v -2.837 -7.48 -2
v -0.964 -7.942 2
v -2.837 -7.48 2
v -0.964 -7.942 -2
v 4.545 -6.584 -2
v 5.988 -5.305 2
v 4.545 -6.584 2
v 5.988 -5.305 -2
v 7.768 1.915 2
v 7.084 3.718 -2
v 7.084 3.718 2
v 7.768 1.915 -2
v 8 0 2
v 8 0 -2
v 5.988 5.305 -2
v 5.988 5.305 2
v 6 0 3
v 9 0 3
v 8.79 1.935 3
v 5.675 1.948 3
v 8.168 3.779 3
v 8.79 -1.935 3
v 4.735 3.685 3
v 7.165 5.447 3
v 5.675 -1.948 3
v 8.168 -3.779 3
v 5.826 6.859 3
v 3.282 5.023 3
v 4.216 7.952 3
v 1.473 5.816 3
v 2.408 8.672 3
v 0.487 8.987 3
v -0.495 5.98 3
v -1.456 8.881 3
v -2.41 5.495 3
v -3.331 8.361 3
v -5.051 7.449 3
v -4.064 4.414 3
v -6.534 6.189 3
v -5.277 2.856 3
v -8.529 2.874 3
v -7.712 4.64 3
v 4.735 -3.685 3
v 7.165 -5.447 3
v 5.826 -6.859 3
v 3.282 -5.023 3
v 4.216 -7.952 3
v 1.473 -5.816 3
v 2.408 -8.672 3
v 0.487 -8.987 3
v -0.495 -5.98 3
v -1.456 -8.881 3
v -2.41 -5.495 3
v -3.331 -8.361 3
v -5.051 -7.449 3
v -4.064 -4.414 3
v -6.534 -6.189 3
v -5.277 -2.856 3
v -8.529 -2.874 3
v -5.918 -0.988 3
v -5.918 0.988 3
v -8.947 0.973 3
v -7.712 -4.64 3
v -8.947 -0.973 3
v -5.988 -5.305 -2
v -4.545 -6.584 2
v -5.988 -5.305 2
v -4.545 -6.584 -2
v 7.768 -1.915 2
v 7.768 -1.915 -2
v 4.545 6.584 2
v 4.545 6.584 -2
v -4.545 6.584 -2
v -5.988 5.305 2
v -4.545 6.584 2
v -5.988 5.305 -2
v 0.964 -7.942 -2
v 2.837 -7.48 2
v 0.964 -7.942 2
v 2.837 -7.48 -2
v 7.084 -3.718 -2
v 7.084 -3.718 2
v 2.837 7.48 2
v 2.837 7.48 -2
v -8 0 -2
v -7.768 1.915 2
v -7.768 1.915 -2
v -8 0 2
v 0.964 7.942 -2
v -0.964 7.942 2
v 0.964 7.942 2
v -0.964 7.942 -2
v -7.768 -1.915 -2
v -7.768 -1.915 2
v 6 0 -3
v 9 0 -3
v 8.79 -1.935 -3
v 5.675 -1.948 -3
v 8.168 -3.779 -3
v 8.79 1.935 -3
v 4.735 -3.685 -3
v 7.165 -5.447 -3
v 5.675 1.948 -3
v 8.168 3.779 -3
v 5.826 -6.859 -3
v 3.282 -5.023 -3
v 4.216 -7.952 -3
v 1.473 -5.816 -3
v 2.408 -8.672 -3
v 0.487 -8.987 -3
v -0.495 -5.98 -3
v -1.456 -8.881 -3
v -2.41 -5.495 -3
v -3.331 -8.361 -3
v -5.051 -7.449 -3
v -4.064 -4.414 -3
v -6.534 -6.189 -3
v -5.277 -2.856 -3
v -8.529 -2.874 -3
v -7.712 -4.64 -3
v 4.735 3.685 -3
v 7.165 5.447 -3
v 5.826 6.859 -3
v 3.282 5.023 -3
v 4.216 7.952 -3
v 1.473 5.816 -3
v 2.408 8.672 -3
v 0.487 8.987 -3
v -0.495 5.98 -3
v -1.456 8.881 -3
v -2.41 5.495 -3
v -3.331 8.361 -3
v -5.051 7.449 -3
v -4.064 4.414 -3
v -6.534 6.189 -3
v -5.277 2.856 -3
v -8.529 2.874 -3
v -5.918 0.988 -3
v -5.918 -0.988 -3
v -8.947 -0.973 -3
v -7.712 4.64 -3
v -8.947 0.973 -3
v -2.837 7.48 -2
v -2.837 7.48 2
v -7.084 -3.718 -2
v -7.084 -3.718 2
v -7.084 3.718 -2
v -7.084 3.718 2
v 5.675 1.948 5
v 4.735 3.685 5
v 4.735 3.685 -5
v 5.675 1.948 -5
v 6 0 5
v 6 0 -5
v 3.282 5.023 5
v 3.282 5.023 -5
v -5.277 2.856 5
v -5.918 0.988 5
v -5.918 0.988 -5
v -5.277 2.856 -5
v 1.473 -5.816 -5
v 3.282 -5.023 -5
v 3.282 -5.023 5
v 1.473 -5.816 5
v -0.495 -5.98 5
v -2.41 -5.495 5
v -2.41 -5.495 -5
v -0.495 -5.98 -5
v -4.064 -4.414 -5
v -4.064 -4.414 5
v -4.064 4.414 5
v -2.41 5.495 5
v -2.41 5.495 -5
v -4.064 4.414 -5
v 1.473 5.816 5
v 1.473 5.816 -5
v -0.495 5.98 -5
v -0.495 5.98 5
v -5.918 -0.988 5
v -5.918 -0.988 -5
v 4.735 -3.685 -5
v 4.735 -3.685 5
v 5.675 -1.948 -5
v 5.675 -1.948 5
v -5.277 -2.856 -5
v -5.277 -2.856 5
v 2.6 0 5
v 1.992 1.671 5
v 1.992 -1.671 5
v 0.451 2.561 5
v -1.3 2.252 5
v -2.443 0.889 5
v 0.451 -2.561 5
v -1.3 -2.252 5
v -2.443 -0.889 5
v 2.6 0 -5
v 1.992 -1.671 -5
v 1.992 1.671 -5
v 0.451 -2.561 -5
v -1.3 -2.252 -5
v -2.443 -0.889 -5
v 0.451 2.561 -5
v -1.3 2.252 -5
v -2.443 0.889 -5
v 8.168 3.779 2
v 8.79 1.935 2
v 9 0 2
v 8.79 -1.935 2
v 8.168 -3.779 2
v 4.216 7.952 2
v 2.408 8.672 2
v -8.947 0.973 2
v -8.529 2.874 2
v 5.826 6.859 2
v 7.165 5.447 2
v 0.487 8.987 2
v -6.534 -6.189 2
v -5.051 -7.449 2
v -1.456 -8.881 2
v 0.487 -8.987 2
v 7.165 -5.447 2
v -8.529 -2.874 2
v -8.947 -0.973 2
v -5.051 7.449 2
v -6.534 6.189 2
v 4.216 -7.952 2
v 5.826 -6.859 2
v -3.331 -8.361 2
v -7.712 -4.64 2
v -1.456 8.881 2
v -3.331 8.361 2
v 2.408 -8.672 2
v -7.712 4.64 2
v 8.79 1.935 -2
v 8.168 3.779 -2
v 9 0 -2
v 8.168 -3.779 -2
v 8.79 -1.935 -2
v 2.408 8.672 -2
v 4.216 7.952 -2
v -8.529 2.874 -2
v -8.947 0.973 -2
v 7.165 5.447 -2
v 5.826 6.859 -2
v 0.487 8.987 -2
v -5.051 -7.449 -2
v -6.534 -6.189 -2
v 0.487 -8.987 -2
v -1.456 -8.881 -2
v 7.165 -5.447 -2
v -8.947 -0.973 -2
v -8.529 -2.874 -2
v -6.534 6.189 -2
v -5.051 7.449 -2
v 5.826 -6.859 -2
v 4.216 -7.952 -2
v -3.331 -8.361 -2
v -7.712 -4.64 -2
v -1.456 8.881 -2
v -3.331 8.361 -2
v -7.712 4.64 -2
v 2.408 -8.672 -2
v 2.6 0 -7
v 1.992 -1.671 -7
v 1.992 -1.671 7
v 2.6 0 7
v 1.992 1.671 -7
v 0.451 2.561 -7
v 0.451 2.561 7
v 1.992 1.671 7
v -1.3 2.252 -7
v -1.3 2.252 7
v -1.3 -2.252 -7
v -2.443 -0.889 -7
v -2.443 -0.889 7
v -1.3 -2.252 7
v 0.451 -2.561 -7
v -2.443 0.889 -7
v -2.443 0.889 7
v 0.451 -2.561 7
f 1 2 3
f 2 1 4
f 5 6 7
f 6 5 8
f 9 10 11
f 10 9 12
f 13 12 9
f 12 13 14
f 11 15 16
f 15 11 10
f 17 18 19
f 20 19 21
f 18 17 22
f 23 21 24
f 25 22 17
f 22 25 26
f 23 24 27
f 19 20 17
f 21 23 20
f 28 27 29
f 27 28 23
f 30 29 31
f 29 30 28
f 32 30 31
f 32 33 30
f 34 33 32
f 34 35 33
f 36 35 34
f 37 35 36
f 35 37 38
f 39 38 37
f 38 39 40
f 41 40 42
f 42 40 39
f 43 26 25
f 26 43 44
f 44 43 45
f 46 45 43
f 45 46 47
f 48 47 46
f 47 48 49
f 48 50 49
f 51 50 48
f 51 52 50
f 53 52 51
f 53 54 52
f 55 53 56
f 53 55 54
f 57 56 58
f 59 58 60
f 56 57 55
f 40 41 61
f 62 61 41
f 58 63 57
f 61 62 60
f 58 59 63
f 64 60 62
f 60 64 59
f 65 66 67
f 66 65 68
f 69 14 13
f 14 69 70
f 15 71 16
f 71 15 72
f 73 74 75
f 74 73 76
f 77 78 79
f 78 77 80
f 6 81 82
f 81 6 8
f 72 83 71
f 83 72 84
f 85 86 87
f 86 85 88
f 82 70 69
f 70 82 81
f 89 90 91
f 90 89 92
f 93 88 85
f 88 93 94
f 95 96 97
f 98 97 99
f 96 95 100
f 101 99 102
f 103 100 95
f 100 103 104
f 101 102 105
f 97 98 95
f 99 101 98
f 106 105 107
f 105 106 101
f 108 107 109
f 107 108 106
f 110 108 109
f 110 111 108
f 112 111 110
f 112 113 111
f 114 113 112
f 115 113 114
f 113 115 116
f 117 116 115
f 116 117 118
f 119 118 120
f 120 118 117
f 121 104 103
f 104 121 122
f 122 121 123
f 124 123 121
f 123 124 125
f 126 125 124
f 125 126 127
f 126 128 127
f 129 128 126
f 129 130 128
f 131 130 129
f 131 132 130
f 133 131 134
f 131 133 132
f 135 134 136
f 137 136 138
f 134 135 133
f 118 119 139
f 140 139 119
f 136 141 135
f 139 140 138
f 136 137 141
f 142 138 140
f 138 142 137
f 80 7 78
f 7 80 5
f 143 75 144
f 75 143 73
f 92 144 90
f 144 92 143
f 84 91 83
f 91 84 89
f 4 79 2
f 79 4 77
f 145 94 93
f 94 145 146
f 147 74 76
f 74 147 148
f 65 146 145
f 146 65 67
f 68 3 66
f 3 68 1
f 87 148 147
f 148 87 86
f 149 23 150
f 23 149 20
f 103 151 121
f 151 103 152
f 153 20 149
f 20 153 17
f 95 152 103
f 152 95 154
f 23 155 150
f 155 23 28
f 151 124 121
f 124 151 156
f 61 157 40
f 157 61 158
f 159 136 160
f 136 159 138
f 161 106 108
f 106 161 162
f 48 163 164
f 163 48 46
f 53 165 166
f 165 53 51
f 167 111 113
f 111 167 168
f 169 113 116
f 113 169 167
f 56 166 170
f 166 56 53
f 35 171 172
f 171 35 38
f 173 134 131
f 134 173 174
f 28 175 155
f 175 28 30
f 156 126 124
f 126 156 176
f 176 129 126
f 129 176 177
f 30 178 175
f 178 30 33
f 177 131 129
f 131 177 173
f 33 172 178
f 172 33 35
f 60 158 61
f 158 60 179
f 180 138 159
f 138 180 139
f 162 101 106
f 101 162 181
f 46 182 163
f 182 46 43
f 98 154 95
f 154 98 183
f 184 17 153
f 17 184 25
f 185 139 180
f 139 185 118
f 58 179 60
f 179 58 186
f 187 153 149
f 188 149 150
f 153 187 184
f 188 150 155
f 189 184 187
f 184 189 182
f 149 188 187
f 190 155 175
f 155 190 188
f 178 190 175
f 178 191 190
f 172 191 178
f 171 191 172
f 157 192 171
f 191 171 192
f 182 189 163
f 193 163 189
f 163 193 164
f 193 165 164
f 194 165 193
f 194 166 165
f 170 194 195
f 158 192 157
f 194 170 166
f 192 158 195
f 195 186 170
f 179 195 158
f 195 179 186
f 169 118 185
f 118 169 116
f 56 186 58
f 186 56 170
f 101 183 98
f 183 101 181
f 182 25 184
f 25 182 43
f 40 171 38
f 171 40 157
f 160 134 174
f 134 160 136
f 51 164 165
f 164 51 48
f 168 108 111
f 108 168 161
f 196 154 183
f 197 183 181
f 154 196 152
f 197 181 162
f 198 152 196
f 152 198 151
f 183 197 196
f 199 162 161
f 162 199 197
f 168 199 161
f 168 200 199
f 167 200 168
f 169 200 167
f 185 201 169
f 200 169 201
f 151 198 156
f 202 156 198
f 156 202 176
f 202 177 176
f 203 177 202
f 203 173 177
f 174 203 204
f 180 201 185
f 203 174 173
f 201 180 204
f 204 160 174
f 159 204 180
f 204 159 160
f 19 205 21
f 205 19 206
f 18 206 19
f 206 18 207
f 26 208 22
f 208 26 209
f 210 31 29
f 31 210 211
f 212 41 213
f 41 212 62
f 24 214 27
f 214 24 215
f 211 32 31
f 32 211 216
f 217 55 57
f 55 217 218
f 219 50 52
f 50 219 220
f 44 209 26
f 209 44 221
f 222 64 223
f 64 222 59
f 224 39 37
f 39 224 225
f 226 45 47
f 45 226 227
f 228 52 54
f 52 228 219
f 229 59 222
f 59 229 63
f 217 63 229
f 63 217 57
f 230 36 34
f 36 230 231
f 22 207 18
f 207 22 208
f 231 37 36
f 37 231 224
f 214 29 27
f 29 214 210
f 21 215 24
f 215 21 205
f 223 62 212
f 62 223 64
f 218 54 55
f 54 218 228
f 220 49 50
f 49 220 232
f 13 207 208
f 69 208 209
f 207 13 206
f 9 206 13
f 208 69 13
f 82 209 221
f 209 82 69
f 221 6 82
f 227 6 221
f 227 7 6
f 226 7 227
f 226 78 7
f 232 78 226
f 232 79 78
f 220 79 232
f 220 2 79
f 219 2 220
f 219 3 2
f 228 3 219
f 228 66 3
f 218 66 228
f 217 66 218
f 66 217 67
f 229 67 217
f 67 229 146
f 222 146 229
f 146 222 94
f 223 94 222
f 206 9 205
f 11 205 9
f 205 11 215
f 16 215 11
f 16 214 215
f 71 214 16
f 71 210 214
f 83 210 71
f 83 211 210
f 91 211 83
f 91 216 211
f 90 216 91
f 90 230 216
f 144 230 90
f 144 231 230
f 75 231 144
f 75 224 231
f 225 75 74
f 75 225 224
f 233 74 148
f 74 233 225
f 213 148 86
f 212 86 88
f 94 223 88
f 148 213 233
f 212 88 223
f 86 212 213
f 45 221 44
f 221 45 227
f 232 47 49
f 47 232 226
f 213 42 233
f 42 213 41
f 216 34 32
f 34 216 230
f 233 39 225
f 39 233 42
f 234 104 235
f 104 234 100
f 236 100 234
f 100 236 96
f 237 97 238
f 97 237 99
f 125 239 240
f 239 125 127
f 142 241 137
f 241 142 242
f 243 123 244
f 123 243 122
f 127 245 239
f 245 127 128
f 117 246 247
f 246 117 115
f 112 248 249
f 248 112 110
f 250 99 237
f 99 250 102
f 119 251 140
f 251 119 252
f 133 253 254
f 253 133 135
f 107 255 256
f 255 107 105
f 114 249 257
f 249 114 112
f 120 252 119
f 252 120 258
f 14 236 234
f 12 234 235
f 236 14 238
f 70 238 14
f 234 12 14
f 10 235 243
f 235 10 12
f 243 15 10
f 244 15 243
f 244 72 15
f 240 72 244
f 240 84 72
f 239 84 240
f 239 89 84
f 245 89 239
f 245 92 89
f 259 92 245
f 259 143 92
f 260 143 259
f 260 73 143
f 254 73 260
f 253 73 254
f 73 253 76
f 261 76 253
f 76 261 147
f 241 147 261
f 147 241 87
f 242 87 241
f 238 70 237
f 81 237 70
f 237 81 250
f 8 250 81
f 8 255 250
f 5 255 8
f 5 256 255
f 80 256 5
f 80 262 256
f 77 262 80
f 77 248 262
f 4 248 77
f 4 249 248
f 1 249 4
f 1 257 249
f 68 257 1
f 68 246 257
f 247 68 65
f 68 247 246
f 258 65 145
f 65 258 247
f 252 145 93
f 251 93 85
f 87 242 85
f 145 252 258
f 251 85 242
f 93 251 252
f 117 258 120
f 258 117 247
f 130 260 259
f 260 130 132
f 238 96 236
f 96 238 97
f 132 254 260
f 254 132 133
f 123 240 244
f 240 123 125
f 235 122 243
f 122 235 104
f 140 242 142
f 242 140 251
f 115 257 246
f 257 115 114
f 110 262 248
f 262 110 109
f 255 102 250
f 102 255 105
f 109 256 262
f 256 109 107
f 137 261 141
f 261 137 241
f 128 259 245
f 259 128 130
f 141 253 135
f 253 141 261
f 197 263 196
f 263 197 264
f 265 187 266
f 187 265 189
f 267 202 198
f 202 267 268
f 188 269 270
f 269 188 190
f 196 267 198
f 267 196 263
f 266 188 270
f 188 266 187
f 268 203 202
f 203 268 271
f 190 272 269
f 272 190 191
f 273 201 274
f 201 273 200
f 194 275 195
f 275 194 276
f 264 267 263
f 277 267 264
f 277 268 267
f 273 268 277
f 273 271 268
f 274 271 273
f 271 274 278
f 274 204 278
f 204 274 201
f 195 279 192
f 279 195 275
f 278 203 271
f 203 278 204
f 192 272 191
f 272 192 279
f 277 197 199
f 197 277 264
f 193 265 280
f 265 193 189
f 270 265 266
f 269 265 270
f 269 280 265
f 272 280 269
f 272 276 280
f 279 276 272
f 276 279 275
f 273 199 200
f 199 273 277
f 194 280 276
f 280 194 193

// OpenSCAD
// Parameters
pulley_type = 0; //[0:1:1]
teeth_count = 20; //[10:60:1]
outer_diameter_mm = 16; //[8:32:0.5]
belt_width_mm = 6; //[3:20:0.5]
bore_diameter_mm = 5; //[2:12:0.1]
hub_diameter_mm = 12; //[6:24:0.5]
hub_length_mm = 10; //[5:25:0.5]
flange_diameter_mm = 18; //[10:40:0.5]
flange_thickness_mm = 1; //[0.5:3:0.1]
set_screw_count = 0; //[0:2:1]
set_screw_diameter_mm = 3; //[2:6:0.1]
set_screw_z_offset_mm = 0; //[-5:5:0.5]
overlap_mm = 1; //[0.5:2:0.1]
clearance_mm = 0.2; //[0:0.6:0.05]
tooth_radial_height_mm = 1; //[0.5:2.5:0.1]
tooth_tangential_width_factor = 0.45; //[0.2:0.8:0.05]

// Pulley module
module pulley() {
  color("Silver") {
    // Pulley body
    union() {
      cylinder(r=outer_diameter_mm/2, h=belt_width_mm, center=true);
      if (pulley_type == 1) {
        for (i = [0:teeth_count-1]) {
          rotate([0, 0, i*360/teeth_count])
          translate([outer_diameter_mm/2 + tooth_radial_height_mm/2 - overlap_mm, 0, 0])
          cube([tooth_radial_height_mm, (PI*outer_diameter_mm/teeth_count)*tooth_tangential_width_factor, belt_width_mm], center=true);
        }
      }
    }
    
    // Hub
    translate([0, 0, 0])
    cylinder(r=hub_diameter_mm/2, h=hub_length_mm, center=true);
    
    // Flanges
    translate([0, 0, belt_width_mm/2 + flange_thickness_mm/2 - overlap_mm])
    cylinder(r=flange_diameter_mm/2, h=flange_thickness_mm, center=true);
    
    translate([0, 0, -(belt_width_mm/2 + flange_thickness_mm/2 - overlap_mm)])
    cylinder(r=flange_diameter_mm/2, h=flange_thickness_mm, center=true);
  }
  
  // Bore
  difference() {
    cylinder(r=(bore_diameter_mm + clearance_mm)/2, h=hub_length_mm + 2*flange_thickness_mm + 2*overlap_mm, center=true);
    
    // Set screw holes
    if (set_screw_count > 0) {
      translate([0, 0, set_screw_z_offset_mm])
      rotate([0, 90, 0])
      cylinder(r=(set_screw_diameter_mm + clearance_mm)/2, h=hub_diameter_mm + 2*overlap_mm, center=true);
      
      if (set_screw_count == 2) {
        translate([0, 0, set_screw_z_offset_mm])
        rotate([90, 0, 0])
        cylinder(r=(set_screw_diameter_mm + clearance_mm)/2, h=hub_diameter_mm + 2*overlap_mm, center=true);
      }
    }
  }
}

// Assembly
module assembly() {
  pulley();
}

assembly();
